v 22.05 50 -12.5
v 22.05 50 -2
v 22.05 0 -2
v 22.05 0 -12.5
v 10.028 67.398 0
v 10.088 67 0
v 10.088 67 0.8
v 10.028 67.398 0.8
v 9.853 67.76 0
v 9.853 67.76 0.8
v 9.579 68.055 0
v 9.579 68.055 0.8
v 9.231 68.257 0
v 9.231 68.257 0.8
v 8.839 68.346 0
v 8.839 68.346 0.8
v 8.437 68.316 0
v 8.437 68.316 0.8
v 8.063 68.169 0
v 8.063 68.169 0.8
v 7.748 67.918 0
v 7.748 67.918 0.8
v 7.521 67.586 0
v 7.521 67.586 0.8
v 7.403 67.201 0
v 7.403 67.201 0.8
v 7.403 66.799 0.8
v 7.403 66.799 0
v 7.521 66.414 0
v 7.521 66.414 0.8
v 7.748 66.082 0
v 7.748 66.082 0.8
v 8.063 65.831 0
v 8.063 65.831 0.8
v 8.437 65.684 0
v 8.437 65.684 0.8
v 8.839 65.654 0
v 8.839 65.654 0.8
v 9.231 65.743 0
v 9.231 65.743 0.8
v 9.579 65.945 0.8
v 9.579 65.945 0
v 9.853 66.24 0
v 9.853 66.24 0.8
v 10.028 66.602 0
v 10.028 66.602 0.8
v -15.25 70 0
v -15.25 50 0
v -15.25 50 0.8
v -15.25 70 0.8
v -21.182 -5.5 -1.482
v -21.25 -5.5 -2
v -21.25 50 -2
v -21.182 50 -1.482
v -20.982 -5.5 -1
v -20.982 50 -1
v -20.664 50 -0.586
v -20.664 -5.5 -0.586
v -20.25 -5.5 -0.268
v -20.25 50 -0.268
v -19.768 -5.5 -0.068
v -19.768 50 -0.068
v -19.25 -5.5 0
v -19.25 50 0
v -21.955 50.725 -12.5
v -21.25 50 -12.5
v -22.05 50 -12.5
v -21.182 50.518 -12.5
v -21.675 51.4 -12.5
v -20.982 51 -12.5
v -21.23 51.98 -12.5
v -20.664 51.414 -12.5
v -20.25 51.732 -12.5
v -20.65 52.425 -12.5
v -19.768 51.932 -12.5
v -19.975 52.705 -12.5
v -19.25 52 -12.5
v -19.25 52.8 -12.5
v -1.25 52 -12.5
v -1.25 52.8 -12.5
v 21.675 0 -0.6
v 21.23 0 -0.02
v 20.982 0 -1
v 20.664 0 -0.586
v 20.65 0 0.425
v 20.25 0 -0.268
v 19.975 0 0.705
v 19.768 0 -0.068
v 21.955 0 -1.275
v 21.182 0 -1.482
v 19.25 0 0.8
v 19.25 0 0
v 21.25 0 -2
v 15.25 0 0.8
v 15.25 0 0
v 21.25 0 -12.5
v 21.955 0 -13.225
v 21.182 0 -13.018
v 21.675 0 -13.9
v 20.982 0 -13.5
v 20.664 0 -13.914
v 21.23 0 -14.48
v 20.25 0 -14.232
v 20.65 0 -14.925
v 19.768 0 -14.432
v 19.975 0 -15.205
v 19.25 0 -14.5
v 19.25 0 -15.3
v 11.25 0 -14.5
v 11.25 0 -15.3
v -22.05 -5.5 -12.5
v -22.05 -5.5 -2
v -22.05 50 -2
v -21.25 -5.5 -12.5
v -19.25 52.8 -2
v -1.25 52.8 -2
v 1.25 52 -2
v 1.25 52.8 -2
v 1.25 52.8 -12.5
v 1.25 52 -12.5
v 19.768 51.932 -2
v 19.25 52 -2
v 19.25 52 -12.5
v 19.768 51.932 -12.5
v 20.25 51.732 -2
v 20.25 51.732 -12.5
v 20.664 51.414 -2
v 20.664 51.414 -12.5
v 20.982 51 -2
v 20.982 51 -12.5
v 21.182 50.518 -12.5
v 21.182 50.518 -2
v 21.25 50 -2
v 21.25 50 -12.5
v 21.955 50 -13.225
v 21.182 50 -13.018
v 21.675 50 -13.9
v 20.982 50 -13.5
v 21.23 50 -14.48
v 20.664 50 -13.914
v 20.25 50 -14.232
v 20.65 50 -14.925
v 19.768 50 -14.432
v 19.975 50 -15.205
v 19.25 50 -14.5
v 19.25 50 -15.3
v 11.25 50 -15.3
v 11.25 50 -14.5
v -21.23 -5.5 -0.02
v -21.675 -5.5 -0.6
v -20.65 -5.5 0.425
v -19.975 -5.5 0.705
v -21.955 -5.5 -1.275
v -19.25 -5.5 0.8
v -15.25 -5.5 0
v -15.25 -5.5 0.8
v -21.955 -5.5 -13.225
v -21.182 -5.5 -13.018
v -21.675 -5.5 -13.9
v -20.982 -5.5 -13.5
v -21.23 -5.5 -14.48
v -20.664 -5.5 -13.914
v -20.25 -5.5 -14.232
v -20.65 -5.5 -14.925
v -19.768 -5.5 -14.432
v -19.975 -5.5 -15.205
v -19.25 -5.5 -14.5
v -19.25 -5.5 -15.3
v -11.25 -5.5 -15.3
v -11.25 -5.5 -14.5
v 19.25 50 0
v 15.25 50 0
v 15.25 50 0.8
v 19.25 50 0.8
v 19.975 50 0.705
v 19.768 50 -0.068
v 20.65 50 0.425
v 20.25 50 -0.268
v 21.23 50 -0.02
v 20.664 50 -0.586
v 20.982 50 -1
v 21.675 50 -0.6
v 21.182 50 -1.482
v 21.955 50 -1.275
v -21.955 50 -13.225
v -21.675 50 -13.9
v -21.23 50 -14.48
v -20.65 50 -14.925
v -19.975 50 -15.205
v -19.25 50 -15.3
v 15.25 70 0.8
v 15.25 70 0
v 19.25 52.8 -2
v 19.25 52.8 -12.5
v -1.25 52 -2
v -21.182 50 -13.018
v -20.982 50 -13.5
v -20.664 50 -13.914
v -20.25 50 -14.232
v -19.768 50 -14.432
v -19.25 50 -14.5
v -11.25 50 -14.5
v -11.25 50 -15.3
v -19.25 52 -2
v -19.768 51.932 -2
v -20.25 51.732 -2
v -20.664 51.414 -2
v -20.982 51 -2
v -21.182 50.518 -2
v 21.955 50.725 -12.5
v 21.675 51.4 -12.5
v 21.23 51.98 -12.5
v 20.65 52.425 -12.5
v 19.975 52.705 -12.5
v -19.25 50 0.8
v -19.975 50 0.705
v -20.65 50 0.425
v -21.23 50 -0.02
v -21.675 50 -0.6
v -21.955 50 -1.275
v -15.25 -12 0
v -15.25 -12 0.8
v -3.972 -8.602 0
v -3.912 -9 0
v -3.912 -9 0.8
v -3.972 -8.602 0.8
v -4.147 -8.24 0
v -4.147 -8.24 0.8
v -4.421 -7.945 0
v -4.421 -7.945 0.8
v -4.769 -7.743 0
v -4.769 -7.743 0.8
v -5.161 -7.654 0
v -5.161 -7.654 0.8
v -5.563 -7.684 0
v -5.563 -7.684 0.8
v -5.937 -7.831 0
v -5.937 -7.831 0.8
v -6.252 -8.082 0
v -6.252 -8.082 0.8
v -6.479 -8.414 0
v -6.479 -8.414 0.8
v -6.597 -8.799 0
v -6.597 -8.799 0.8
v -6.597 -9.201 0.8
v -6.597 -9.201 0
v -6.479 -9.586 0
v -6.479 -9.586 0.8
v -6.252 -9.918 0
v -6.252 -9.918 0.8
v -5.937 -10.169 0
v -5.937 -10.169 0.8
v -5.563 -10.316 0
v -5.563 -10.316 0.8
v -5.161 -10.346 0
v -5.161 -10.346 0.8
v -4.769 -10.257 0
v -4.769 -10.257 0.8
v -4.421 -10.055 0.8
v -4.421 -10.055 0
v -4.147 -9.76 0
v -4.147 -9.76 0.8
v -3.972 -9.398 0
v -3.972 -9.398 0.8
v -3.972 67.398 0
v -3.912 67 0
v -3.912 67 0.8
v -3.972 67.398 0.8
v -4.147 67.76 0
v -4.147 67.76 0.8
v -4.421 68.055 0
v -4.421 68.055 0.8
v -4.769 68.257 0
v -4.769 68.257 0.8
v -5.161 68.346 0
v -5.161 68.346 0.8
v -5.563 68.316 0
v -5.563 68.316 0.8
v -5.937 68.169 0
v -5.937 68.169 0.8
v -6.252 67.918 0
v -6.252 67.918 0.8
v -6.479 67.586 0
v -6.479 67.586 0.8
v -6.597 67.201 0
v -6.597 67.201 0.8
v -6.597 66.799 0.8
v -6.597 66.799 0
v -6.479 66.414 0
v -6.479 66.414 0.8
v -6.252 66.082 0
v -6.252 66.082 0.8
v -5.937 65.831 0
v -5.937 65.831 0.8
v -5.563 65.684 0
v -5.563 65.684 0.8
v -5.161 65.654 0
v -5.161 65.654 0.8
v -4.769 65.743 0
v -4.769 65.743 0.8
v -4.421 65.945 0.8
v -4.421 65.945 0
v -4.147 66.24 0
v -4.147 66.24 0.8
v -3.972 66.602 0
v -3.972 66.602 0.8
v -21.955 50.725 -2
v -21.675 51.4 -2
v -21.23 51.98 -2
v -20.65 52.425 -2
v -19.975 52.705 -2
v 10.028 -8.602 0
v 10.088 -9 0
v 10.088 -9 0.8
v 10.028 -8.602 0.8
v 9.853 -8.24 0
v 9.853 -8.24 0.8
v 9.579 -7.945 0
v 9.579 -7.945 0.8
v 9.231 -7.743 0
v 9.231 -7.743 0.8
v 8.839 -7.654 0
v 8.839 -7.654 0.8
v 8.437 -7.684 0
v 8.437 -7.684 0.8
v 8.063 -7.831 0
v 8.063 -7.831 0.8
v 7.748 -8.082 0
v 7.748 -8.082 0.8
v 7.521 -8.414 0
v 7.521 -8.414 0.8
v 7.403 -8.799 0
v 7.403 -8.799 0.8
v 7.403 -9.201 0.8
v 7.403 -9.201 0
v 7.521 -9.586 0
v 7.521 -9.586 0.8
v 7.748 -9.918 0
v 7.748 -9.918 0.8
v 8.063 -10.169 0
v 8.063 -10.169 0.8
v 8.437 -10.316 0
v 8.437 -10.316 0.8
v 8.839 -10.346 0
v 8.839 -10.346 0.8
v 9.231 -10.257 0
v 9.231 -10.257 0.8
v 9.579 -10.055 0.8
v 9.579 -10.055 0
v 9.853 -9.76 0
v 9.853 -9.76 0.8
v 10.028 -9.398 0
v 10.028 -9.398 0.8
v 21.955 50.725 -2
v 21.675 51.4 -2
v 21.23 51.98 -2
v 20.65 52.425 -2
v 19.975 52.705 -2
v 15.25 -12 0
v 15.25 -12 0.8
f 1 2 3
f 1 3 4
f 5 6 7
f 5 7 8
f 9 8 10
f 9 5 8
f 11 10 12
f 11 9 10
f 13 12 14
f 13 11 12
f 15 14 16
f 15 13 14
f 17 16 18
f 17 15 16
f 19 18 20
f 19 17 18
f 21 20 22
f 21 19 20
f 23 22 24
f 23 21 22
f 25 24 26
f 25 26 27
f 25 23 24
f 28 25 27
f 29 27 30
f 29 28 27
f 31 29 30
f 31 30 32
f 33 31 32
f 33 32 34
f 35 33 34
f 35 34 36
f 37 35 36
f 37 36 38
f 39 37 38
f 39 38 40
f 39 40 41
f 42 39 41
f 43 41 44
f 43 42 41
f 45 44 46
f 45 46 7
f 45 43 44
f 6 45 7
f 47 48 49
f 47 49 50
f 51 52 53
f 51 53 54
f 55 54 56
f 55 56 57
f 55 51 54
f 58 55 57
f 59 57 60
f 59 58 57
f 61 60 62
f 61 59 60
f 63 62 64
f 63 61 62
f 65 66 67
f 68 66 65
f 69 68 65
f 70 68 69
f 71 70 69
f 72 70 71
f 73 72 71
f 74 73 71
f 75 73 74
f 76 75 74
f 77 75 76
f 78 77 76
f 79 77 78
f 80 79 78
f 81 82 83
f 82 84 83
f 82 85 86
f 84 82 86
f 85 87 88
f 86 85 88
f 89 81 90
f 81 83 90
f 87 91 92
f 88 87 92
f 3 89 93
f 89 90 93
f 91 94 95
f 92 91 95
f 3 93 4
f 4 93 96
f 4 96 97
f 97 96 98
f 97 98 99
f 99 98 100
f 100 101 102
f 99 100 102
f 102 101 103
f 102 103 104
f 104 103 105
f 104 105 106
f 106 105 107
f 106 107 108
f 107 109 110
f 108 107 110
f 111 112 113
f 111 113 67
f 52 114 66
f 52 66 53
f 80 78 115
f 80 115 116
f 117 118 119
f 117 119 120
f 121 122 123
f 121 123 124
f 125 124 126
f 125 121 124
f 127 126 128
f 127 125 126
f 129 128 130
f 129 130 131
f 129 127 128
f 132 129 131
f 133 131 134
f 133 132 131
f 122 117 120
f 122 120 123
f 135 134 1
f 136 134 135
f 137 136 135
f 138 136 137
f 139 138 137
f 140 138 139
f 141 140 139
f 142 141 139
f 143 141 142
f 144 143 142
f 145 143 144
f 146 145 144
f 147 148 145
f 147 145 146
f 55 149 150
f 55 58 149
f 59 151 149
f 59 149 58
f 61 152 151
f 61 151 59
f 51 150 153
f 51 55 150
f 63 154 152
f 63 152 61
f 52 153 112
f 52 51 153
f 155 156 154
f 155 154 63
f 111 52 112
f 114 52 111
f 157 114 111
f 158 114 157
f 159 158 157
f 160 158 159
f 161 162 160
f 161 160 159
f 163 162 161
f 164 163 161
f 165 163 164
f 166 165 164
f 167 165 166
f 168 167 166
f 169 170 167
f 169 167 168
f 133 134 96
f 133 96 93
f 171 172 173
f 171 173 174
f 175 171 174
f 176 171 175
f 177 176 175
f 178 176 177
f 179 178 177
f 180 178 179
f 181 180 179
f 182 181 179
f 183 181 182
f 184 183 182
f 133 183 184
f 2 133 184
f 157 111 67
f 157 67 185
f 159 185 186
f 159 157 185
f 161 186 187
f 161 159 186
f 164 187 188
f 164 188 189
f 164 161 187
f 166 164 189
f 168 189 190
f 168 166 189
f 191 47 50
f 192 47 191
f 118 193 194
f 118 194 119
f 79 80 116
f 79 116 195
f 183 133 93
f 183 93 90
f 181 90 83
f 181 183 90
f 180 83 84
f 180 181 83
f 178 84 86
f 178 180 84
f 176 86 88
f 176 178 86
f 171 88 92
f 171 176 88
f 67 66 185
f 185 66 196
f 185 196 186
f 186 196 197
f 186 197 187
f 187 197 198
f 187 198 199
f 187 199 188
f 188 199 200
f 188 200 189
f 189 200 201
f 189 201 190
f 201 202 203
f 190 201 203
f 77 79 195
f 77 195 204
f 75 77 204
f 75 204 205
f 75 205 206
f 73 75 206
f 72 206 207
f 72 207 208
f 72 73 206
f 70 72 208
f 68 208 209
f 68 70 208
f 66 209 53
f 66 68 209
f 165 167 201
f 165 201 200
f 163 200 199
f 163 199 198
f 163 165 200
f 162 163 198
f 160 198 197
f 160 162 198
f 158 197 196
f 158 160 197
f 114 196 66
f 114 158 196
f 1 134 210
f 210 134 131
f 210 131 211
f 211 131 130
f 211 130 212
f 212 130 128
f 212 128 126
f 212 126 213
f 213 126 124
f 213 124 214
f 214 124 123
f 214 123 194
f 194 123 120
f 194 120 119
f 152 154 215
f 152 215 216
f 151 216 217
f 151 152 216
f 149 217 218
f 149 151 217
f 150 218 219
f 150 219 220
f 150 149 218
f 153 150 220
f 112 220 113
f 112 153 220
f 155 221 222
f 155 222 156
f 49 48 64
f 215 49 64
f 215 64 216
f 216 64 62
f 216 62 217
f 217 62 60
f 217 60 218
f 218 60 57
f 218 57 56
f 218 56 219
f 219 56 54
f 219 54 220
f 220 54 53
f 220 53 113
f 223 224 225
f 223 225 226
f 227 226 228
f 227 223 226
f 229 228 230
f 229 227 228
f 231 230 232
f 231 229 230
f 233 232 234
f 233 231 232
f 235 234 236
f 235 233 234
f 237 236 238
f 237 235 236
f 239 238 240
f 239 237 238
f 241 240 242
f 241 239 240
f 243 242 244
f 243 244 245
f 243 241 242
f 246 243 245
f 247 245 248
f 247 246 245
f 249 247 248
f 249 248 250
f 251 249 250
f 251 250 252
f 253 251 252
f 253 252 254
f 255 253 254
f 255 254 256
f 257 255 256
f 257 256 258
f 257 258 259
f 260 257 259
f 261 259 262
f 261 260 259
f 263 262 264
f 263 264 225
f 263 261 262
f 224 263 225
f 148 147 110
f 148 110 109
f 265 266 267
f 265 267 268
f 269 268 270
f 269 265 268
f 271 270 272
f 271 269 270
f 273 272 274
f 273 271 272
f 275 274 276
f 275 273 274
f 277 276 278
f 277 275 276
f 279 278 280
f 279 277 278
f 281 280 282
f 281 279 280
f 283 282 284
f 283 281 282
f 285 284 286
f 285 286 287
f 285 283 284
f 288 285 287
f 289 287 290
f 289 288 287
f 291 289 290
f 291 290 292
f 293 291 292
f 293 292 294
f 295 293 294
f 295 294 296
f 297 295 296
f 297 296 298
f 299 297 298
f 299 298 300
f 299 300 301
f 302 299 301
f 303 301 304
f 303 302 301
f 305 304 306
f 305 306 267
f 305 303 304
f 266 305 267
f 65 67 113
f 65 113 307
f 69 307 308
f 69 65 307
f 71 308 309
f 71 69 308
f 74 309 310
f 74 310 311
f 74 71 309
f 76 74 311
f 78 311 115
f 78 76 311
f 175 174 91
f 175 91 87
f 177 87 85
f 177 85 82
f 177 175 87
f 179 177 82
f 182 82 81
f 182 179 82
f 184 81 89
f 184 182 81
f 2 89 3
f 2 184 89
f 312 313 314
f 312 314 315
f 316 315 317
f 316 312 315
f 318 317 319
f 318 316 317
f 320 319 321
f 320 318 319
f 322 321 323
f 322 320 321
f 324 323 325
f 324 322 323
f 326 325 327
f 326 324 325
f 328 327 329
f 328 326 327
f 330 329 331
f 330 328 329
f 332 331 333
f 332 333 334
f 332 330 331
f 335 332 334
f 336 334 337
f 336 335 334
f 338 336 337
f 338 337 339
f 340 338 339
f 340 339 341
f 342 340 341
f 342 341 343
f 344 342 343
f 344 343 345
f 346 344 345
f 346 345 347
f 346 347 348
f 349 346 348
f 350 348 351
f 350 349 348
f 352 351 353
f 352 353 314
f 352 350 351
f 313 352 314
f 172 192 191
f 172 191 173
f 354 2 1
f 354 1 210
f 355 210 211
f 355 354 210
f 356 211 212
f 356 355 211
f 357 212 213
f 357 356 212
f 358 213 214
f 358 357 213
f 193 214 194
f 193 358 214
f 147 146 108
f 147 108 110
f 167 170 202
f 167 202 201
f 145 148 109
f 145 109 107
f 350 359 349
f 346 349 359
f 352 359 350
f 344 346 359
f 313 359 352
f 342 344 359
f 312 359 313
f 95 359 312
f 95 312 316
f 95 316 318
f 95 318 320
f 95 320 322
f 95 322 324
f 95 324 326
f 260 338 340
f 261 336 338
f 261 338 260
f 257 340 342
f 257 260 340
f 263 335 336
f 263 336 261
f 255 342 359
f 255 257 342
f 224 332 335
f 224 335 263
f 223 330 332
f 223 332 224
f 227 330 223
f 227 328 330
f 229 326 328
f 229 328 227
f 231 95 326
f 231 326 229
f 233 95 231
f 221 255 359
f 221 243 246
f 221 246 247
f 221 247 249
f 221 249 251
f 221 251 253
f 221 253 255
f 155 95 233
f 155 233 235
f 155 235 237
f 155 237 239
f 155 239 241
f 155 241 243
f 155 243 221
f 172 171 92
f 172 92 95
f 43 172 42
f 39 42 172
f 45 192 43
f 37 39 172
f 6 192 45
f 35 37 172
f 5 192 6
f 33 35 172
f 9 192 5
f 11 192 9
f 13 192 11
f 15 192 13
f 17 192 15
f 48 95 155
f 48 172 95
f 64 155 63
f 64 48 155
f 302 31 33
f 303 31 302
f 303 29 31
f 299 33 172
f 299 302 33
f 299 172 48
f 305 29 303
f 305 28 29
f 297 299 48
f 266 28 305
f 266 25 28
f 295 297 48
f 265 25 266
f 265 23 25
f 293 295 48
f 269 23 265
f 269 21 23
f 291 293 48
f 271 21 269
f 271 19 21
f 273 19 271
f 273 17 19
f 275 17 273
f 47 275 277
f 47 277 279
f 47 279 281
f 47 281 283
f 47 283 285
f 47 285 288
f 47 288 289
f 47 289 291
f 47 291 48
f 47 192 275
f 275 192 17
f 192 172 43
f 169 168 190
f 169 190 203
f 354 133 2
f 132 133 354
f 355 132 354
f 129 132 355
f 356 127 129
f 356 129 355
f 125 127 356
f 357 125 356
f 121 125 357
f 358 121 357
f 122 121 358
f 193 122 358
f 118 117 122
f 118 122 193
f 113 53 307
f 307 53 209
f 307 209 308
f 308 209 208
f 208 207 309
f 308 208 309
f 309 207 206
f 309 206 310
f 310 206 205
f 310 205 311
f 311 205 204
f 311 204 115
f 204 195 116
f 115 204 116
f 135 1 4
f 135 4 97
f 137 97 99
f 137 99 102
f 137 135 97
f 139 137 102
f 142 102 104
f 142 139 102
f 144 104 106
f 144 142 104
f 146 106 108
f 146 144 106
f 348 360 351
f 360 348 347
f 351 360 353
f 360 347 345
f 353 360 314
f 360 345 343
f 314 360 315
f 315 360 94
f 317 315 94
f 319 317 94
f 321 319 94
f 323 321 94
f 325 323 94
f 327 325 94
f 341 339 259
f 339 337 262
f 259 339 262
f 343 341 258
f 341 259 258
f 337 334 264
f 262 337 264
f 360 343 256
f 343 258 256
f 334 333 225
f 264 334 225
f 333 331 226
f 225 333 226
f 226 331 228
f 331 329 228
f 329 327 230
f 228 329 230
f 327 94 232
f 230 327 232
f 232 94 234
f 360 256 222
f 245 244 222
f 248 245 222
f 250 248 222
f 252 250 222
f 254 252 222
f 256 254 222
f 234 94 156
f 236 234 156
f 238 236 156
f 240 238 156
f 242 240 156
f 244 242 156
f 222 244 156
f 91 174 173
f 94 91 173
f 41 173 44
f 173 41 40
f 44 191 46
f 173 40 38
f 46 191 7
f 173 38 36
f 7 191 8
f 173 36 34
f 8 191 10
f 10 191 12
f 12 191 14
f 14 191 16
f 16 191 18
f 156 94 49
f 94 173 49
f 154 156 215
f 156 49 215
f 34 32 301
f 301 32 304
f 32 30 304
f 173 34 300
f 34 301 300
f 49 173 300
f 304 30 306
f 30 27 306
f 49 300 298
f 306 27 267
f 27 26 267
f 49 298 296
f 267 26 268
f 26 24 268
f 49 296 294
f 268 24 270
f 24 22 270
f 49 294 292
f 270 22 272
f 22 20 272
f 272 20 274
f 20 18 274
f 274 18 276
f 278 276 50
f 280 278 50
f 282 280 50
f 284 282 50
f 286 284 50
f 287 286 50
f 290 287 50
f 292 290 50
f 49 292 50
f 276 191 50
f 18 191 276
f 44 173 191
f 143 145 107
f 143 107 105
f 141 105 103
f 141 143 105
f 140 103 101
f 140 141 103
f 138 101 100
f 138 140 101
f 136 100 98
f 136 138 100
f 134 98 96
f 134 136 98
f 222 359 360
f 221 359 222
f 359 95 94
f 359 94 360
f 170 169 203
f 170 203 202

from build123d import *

# Parameters (mm, degrees)
SKETCH1_R                      = 1.35
BASE_FLANGE1_DEPTH             = 0.8
EDGE_FLANGE1_STRIP_W           = 7.2
EDGE_FLANGE1_STRIP_H           = 0.8
EDGE_FLANGE1_STRIP_CUT_DEPTH   = 50
EDGE_FLANGE1_STRIP_2_W         = 7.2
EDGE_FLANGE1_STRIP_2_H         = 0.8
EDGE_FLANGE1_STRIP_CUT_2_DEPTH = 55.5
EDGE_FLANGE1_DEPTH             = 50
EDGE_FLANGE1_BEND_DEPTH        = 55.5
EDGE_FLANGE4_DEPTH             = 10.5
EDGE_FLANGE4_BEND_DEPTH        = 10.5
EDGE_FLANGE5_DEPTH             = 50
EDGE_FLANGE5_BEND_DEPTH        = 55.5


# Sheet-metal steps are written as plain solids
with BuildPart() as part:
    # Sketch1 → Base-Flange1 (new body)
    with BuildSketch(Plane.XY):
        Polygon((15.25, 0), (15.25, -12), (-15.25, -12), (-15.25, -5.5), (-21.25, -5.5), (-21.25, 50), (-15.25, 50), (-15.25, 70), (15.25, 70), (15.25, 50), (21.25, 50), (21.25, 0), align=None)
        with Locations((8.737756115, -9)):
            Circle(SKETCH1_R, mode=Mode.SUBTRACT)
        with Locations((-5.262243885, -9)):
            Circle(SKETCH1_R, mode=Mode.SUBTRACT)
        with Locations((8.737756115, 67)):
            Circle(SKETCH1_R, mode=Mode.SUBTRACT)
        with Locations((-5.262243885, 67)):
            Circle(SKETCH1_R, mode=Mode.SUBTRACT)
    extrude(amount=BASE_FLANGE1_DEPTH)

    # Edge-Flange1 strip (across the edge) → Edge-Flange1 strip cut (cut)
    with BuildSketch(Plane(origin=(21.25, 50, 0), x_dir=(-1, 0, 0), z_dir=(0, -1, 0))):
        with Locations((-1.6, -0.4)):
            Rectangle(EDGE_FLANGE1_STRIP_W, EDGE_FLANGE1_STRIP_H)
    extrude(amount=EDGE_FLANGE1_STRIP_CUT_DEPTH, mode=Mode.SUBTRACT)

    # Edge-Flange1 strip 2 (across the edge) → Edge-Flange1 strip cut 2 (cut)
    with BuildSketch(Plane(origin=(-21.25, -5.5, 0), x_dir=(1, 0, 0), z_dir=(0, 1, 0))):
        with Locations((-1.6, -0.4)):
            Rectangle(EDGE_FLANGE1_STRIP_2_W, EDGE_FLANGE1_STRIP_2_H)
    extrude(amount=EDGE_FLANGE1_STRIP_CUT_2_DEPTH, mode=Mode.SUBTRACT)

    # Edge-Flange1 section (across the edge) → Edge-Flange1 (add)
    with BuildSketch(Plane(origin=(21.25, 50, 0), x_dir=(-1, 0, 0), z_dir=(0, -1, 0))):
        with BuildLine():
            Line((-0.8, 2), (-0.8, 12.5))
            Line((-0.8, 12.5), (0, 12.5))
            Line((0, 12.5), (0, 2))
            ThreePointArc((0, 2), (0.585786438, 0.585786438), (2, 0))
            Line((2, 0), (2, -0.8))
            ThreePointArc((2, -0.8), (0.020101013, 0.020101013), (-0.8, 2))
        make_face()
    extrude(amount=EDGE_FLANGE1_DEPTH)

    # Edge-Flange1 section 2 (across the edge) → Edge-Flange1 bend (add)
    with BuildSketch(Plane(origin=(-21.25, -5.5, 0), x_dir=(1, 0, 0), z_dir=(0, 1, 0))):
        with BuildLine():
            Line((-0.8, 2), (-0.8, 12.5))
            Line((-0.8, 12.5), (0, 12.5))
            Line((0, 12.5), (0, 2))
            ThreePointArc((0, 2), (0.585786438, 0.585786438), (2, 0))
            Line((2, 0), (2, -0.8))
            ThreePointArc((2, -0.8), (0.020101013, 0.020101013), (-0.8, 2))
        make_face()
    extrude(amount=EDGE_FLANGE1_BEND_DEPTH)

    # Edge-Flange4 section (across the edge) → Edge-Flange4 (add)
    with BuildSketch(Plane(origin=(21.25, 52, -2), x_dir=(0, -1, 0), z_dir=(0, 0, -1))):
        with BuildLine():
            Line((-0.8, 2), (-0.8, 20))
            Line((-0.8, 20), (0, 20))
            Line((0, 20), (0, 2))
            ThreePointArc((0, 2), (0.585786438, 0.585786438), (2, 0))
            Line((2, 0), (2, -0.8))
            ThreePointArc((2, -0.8), (0.020101013, 0.020101013), (-0.8, 2))
        make_face()
    extrude(amount=EDGE_FLANGE4_DEPTH)

    # Edge-Flange4 section 2 (across the edge) → Edge-Flange4 bend (add)
    with BuildSketch(Plane(origin=(-21.25, 52, -12.5), x_dir=(0, -1, 0), z_dir=(0, 0, 1))):
        with BuildLine():
            Line((-0.8, 2), (-0.8, 20))
            Line((-0.8, 20), (0, 20))
            Line((0, 20), (0, 2))
            ThreePointArc((0, 2), (0.585786438, 0.585786438), (2, 0))
            Line((2, 0), (2, -0.8))
            ThreePointArc((2, -0.8), (0.020101013, 0.020101013), (-0.8, 2))
        make_face()
    extrude(amount=EDGE_FLANGE4_BEND_DEPTH)

    # Edge-Flange5 section (across the edge) → Edge-Flange5 (add)
    with BuildSketch(Plane(origin=(21.25, 50, -14.5), x_dir=(0, 0, 1), z_dir=(0, -1, 0))):
        with BuildLine():
            Line((-0.8, 2), (-0.8, 10))
            Line((-0.8, 10), (0, 10))
            Line((0, 10), (0, 2))
            ThreePointArc((0, 2), (0.585786438, 0.585786438), (2, 0))
            Line((2, 0), (2, -0.8))
            ThreePointArc((2, -0.8), (0.020101013, 0.020101013), (-0.8, 2))
        make_face()
    extrude(amount=EDGE_FLANGE5_DEPTH)

    # Edge-Flange5 section 2 (across the edge) → Edge-Flange5 bend (add)
    with BuildSketch(Plane(origin=(-21.25, -5.5, -14.5), x_dir=(0, 0, 1), z_dir=(0, 1, 0))):
        with BuildLine():
            Line((-0.8, 2), (-0.8, 10))
            Line((-0.8, 10), (0, 10))
            Line((0, 10), (0, 2))
            ThreePointArc((0, 2), (0.585786438, 0.585786438), (2, 0))
            Line((2, 0), (2, -0.8))
            ThreePointArc((2, -0.8), (0.020101013, 0.020101013), (-0.8, 2))
        make_face()
    extrude(amount=EDGE_FLANGE5_BEND_DEPTH)


solid = part.part
